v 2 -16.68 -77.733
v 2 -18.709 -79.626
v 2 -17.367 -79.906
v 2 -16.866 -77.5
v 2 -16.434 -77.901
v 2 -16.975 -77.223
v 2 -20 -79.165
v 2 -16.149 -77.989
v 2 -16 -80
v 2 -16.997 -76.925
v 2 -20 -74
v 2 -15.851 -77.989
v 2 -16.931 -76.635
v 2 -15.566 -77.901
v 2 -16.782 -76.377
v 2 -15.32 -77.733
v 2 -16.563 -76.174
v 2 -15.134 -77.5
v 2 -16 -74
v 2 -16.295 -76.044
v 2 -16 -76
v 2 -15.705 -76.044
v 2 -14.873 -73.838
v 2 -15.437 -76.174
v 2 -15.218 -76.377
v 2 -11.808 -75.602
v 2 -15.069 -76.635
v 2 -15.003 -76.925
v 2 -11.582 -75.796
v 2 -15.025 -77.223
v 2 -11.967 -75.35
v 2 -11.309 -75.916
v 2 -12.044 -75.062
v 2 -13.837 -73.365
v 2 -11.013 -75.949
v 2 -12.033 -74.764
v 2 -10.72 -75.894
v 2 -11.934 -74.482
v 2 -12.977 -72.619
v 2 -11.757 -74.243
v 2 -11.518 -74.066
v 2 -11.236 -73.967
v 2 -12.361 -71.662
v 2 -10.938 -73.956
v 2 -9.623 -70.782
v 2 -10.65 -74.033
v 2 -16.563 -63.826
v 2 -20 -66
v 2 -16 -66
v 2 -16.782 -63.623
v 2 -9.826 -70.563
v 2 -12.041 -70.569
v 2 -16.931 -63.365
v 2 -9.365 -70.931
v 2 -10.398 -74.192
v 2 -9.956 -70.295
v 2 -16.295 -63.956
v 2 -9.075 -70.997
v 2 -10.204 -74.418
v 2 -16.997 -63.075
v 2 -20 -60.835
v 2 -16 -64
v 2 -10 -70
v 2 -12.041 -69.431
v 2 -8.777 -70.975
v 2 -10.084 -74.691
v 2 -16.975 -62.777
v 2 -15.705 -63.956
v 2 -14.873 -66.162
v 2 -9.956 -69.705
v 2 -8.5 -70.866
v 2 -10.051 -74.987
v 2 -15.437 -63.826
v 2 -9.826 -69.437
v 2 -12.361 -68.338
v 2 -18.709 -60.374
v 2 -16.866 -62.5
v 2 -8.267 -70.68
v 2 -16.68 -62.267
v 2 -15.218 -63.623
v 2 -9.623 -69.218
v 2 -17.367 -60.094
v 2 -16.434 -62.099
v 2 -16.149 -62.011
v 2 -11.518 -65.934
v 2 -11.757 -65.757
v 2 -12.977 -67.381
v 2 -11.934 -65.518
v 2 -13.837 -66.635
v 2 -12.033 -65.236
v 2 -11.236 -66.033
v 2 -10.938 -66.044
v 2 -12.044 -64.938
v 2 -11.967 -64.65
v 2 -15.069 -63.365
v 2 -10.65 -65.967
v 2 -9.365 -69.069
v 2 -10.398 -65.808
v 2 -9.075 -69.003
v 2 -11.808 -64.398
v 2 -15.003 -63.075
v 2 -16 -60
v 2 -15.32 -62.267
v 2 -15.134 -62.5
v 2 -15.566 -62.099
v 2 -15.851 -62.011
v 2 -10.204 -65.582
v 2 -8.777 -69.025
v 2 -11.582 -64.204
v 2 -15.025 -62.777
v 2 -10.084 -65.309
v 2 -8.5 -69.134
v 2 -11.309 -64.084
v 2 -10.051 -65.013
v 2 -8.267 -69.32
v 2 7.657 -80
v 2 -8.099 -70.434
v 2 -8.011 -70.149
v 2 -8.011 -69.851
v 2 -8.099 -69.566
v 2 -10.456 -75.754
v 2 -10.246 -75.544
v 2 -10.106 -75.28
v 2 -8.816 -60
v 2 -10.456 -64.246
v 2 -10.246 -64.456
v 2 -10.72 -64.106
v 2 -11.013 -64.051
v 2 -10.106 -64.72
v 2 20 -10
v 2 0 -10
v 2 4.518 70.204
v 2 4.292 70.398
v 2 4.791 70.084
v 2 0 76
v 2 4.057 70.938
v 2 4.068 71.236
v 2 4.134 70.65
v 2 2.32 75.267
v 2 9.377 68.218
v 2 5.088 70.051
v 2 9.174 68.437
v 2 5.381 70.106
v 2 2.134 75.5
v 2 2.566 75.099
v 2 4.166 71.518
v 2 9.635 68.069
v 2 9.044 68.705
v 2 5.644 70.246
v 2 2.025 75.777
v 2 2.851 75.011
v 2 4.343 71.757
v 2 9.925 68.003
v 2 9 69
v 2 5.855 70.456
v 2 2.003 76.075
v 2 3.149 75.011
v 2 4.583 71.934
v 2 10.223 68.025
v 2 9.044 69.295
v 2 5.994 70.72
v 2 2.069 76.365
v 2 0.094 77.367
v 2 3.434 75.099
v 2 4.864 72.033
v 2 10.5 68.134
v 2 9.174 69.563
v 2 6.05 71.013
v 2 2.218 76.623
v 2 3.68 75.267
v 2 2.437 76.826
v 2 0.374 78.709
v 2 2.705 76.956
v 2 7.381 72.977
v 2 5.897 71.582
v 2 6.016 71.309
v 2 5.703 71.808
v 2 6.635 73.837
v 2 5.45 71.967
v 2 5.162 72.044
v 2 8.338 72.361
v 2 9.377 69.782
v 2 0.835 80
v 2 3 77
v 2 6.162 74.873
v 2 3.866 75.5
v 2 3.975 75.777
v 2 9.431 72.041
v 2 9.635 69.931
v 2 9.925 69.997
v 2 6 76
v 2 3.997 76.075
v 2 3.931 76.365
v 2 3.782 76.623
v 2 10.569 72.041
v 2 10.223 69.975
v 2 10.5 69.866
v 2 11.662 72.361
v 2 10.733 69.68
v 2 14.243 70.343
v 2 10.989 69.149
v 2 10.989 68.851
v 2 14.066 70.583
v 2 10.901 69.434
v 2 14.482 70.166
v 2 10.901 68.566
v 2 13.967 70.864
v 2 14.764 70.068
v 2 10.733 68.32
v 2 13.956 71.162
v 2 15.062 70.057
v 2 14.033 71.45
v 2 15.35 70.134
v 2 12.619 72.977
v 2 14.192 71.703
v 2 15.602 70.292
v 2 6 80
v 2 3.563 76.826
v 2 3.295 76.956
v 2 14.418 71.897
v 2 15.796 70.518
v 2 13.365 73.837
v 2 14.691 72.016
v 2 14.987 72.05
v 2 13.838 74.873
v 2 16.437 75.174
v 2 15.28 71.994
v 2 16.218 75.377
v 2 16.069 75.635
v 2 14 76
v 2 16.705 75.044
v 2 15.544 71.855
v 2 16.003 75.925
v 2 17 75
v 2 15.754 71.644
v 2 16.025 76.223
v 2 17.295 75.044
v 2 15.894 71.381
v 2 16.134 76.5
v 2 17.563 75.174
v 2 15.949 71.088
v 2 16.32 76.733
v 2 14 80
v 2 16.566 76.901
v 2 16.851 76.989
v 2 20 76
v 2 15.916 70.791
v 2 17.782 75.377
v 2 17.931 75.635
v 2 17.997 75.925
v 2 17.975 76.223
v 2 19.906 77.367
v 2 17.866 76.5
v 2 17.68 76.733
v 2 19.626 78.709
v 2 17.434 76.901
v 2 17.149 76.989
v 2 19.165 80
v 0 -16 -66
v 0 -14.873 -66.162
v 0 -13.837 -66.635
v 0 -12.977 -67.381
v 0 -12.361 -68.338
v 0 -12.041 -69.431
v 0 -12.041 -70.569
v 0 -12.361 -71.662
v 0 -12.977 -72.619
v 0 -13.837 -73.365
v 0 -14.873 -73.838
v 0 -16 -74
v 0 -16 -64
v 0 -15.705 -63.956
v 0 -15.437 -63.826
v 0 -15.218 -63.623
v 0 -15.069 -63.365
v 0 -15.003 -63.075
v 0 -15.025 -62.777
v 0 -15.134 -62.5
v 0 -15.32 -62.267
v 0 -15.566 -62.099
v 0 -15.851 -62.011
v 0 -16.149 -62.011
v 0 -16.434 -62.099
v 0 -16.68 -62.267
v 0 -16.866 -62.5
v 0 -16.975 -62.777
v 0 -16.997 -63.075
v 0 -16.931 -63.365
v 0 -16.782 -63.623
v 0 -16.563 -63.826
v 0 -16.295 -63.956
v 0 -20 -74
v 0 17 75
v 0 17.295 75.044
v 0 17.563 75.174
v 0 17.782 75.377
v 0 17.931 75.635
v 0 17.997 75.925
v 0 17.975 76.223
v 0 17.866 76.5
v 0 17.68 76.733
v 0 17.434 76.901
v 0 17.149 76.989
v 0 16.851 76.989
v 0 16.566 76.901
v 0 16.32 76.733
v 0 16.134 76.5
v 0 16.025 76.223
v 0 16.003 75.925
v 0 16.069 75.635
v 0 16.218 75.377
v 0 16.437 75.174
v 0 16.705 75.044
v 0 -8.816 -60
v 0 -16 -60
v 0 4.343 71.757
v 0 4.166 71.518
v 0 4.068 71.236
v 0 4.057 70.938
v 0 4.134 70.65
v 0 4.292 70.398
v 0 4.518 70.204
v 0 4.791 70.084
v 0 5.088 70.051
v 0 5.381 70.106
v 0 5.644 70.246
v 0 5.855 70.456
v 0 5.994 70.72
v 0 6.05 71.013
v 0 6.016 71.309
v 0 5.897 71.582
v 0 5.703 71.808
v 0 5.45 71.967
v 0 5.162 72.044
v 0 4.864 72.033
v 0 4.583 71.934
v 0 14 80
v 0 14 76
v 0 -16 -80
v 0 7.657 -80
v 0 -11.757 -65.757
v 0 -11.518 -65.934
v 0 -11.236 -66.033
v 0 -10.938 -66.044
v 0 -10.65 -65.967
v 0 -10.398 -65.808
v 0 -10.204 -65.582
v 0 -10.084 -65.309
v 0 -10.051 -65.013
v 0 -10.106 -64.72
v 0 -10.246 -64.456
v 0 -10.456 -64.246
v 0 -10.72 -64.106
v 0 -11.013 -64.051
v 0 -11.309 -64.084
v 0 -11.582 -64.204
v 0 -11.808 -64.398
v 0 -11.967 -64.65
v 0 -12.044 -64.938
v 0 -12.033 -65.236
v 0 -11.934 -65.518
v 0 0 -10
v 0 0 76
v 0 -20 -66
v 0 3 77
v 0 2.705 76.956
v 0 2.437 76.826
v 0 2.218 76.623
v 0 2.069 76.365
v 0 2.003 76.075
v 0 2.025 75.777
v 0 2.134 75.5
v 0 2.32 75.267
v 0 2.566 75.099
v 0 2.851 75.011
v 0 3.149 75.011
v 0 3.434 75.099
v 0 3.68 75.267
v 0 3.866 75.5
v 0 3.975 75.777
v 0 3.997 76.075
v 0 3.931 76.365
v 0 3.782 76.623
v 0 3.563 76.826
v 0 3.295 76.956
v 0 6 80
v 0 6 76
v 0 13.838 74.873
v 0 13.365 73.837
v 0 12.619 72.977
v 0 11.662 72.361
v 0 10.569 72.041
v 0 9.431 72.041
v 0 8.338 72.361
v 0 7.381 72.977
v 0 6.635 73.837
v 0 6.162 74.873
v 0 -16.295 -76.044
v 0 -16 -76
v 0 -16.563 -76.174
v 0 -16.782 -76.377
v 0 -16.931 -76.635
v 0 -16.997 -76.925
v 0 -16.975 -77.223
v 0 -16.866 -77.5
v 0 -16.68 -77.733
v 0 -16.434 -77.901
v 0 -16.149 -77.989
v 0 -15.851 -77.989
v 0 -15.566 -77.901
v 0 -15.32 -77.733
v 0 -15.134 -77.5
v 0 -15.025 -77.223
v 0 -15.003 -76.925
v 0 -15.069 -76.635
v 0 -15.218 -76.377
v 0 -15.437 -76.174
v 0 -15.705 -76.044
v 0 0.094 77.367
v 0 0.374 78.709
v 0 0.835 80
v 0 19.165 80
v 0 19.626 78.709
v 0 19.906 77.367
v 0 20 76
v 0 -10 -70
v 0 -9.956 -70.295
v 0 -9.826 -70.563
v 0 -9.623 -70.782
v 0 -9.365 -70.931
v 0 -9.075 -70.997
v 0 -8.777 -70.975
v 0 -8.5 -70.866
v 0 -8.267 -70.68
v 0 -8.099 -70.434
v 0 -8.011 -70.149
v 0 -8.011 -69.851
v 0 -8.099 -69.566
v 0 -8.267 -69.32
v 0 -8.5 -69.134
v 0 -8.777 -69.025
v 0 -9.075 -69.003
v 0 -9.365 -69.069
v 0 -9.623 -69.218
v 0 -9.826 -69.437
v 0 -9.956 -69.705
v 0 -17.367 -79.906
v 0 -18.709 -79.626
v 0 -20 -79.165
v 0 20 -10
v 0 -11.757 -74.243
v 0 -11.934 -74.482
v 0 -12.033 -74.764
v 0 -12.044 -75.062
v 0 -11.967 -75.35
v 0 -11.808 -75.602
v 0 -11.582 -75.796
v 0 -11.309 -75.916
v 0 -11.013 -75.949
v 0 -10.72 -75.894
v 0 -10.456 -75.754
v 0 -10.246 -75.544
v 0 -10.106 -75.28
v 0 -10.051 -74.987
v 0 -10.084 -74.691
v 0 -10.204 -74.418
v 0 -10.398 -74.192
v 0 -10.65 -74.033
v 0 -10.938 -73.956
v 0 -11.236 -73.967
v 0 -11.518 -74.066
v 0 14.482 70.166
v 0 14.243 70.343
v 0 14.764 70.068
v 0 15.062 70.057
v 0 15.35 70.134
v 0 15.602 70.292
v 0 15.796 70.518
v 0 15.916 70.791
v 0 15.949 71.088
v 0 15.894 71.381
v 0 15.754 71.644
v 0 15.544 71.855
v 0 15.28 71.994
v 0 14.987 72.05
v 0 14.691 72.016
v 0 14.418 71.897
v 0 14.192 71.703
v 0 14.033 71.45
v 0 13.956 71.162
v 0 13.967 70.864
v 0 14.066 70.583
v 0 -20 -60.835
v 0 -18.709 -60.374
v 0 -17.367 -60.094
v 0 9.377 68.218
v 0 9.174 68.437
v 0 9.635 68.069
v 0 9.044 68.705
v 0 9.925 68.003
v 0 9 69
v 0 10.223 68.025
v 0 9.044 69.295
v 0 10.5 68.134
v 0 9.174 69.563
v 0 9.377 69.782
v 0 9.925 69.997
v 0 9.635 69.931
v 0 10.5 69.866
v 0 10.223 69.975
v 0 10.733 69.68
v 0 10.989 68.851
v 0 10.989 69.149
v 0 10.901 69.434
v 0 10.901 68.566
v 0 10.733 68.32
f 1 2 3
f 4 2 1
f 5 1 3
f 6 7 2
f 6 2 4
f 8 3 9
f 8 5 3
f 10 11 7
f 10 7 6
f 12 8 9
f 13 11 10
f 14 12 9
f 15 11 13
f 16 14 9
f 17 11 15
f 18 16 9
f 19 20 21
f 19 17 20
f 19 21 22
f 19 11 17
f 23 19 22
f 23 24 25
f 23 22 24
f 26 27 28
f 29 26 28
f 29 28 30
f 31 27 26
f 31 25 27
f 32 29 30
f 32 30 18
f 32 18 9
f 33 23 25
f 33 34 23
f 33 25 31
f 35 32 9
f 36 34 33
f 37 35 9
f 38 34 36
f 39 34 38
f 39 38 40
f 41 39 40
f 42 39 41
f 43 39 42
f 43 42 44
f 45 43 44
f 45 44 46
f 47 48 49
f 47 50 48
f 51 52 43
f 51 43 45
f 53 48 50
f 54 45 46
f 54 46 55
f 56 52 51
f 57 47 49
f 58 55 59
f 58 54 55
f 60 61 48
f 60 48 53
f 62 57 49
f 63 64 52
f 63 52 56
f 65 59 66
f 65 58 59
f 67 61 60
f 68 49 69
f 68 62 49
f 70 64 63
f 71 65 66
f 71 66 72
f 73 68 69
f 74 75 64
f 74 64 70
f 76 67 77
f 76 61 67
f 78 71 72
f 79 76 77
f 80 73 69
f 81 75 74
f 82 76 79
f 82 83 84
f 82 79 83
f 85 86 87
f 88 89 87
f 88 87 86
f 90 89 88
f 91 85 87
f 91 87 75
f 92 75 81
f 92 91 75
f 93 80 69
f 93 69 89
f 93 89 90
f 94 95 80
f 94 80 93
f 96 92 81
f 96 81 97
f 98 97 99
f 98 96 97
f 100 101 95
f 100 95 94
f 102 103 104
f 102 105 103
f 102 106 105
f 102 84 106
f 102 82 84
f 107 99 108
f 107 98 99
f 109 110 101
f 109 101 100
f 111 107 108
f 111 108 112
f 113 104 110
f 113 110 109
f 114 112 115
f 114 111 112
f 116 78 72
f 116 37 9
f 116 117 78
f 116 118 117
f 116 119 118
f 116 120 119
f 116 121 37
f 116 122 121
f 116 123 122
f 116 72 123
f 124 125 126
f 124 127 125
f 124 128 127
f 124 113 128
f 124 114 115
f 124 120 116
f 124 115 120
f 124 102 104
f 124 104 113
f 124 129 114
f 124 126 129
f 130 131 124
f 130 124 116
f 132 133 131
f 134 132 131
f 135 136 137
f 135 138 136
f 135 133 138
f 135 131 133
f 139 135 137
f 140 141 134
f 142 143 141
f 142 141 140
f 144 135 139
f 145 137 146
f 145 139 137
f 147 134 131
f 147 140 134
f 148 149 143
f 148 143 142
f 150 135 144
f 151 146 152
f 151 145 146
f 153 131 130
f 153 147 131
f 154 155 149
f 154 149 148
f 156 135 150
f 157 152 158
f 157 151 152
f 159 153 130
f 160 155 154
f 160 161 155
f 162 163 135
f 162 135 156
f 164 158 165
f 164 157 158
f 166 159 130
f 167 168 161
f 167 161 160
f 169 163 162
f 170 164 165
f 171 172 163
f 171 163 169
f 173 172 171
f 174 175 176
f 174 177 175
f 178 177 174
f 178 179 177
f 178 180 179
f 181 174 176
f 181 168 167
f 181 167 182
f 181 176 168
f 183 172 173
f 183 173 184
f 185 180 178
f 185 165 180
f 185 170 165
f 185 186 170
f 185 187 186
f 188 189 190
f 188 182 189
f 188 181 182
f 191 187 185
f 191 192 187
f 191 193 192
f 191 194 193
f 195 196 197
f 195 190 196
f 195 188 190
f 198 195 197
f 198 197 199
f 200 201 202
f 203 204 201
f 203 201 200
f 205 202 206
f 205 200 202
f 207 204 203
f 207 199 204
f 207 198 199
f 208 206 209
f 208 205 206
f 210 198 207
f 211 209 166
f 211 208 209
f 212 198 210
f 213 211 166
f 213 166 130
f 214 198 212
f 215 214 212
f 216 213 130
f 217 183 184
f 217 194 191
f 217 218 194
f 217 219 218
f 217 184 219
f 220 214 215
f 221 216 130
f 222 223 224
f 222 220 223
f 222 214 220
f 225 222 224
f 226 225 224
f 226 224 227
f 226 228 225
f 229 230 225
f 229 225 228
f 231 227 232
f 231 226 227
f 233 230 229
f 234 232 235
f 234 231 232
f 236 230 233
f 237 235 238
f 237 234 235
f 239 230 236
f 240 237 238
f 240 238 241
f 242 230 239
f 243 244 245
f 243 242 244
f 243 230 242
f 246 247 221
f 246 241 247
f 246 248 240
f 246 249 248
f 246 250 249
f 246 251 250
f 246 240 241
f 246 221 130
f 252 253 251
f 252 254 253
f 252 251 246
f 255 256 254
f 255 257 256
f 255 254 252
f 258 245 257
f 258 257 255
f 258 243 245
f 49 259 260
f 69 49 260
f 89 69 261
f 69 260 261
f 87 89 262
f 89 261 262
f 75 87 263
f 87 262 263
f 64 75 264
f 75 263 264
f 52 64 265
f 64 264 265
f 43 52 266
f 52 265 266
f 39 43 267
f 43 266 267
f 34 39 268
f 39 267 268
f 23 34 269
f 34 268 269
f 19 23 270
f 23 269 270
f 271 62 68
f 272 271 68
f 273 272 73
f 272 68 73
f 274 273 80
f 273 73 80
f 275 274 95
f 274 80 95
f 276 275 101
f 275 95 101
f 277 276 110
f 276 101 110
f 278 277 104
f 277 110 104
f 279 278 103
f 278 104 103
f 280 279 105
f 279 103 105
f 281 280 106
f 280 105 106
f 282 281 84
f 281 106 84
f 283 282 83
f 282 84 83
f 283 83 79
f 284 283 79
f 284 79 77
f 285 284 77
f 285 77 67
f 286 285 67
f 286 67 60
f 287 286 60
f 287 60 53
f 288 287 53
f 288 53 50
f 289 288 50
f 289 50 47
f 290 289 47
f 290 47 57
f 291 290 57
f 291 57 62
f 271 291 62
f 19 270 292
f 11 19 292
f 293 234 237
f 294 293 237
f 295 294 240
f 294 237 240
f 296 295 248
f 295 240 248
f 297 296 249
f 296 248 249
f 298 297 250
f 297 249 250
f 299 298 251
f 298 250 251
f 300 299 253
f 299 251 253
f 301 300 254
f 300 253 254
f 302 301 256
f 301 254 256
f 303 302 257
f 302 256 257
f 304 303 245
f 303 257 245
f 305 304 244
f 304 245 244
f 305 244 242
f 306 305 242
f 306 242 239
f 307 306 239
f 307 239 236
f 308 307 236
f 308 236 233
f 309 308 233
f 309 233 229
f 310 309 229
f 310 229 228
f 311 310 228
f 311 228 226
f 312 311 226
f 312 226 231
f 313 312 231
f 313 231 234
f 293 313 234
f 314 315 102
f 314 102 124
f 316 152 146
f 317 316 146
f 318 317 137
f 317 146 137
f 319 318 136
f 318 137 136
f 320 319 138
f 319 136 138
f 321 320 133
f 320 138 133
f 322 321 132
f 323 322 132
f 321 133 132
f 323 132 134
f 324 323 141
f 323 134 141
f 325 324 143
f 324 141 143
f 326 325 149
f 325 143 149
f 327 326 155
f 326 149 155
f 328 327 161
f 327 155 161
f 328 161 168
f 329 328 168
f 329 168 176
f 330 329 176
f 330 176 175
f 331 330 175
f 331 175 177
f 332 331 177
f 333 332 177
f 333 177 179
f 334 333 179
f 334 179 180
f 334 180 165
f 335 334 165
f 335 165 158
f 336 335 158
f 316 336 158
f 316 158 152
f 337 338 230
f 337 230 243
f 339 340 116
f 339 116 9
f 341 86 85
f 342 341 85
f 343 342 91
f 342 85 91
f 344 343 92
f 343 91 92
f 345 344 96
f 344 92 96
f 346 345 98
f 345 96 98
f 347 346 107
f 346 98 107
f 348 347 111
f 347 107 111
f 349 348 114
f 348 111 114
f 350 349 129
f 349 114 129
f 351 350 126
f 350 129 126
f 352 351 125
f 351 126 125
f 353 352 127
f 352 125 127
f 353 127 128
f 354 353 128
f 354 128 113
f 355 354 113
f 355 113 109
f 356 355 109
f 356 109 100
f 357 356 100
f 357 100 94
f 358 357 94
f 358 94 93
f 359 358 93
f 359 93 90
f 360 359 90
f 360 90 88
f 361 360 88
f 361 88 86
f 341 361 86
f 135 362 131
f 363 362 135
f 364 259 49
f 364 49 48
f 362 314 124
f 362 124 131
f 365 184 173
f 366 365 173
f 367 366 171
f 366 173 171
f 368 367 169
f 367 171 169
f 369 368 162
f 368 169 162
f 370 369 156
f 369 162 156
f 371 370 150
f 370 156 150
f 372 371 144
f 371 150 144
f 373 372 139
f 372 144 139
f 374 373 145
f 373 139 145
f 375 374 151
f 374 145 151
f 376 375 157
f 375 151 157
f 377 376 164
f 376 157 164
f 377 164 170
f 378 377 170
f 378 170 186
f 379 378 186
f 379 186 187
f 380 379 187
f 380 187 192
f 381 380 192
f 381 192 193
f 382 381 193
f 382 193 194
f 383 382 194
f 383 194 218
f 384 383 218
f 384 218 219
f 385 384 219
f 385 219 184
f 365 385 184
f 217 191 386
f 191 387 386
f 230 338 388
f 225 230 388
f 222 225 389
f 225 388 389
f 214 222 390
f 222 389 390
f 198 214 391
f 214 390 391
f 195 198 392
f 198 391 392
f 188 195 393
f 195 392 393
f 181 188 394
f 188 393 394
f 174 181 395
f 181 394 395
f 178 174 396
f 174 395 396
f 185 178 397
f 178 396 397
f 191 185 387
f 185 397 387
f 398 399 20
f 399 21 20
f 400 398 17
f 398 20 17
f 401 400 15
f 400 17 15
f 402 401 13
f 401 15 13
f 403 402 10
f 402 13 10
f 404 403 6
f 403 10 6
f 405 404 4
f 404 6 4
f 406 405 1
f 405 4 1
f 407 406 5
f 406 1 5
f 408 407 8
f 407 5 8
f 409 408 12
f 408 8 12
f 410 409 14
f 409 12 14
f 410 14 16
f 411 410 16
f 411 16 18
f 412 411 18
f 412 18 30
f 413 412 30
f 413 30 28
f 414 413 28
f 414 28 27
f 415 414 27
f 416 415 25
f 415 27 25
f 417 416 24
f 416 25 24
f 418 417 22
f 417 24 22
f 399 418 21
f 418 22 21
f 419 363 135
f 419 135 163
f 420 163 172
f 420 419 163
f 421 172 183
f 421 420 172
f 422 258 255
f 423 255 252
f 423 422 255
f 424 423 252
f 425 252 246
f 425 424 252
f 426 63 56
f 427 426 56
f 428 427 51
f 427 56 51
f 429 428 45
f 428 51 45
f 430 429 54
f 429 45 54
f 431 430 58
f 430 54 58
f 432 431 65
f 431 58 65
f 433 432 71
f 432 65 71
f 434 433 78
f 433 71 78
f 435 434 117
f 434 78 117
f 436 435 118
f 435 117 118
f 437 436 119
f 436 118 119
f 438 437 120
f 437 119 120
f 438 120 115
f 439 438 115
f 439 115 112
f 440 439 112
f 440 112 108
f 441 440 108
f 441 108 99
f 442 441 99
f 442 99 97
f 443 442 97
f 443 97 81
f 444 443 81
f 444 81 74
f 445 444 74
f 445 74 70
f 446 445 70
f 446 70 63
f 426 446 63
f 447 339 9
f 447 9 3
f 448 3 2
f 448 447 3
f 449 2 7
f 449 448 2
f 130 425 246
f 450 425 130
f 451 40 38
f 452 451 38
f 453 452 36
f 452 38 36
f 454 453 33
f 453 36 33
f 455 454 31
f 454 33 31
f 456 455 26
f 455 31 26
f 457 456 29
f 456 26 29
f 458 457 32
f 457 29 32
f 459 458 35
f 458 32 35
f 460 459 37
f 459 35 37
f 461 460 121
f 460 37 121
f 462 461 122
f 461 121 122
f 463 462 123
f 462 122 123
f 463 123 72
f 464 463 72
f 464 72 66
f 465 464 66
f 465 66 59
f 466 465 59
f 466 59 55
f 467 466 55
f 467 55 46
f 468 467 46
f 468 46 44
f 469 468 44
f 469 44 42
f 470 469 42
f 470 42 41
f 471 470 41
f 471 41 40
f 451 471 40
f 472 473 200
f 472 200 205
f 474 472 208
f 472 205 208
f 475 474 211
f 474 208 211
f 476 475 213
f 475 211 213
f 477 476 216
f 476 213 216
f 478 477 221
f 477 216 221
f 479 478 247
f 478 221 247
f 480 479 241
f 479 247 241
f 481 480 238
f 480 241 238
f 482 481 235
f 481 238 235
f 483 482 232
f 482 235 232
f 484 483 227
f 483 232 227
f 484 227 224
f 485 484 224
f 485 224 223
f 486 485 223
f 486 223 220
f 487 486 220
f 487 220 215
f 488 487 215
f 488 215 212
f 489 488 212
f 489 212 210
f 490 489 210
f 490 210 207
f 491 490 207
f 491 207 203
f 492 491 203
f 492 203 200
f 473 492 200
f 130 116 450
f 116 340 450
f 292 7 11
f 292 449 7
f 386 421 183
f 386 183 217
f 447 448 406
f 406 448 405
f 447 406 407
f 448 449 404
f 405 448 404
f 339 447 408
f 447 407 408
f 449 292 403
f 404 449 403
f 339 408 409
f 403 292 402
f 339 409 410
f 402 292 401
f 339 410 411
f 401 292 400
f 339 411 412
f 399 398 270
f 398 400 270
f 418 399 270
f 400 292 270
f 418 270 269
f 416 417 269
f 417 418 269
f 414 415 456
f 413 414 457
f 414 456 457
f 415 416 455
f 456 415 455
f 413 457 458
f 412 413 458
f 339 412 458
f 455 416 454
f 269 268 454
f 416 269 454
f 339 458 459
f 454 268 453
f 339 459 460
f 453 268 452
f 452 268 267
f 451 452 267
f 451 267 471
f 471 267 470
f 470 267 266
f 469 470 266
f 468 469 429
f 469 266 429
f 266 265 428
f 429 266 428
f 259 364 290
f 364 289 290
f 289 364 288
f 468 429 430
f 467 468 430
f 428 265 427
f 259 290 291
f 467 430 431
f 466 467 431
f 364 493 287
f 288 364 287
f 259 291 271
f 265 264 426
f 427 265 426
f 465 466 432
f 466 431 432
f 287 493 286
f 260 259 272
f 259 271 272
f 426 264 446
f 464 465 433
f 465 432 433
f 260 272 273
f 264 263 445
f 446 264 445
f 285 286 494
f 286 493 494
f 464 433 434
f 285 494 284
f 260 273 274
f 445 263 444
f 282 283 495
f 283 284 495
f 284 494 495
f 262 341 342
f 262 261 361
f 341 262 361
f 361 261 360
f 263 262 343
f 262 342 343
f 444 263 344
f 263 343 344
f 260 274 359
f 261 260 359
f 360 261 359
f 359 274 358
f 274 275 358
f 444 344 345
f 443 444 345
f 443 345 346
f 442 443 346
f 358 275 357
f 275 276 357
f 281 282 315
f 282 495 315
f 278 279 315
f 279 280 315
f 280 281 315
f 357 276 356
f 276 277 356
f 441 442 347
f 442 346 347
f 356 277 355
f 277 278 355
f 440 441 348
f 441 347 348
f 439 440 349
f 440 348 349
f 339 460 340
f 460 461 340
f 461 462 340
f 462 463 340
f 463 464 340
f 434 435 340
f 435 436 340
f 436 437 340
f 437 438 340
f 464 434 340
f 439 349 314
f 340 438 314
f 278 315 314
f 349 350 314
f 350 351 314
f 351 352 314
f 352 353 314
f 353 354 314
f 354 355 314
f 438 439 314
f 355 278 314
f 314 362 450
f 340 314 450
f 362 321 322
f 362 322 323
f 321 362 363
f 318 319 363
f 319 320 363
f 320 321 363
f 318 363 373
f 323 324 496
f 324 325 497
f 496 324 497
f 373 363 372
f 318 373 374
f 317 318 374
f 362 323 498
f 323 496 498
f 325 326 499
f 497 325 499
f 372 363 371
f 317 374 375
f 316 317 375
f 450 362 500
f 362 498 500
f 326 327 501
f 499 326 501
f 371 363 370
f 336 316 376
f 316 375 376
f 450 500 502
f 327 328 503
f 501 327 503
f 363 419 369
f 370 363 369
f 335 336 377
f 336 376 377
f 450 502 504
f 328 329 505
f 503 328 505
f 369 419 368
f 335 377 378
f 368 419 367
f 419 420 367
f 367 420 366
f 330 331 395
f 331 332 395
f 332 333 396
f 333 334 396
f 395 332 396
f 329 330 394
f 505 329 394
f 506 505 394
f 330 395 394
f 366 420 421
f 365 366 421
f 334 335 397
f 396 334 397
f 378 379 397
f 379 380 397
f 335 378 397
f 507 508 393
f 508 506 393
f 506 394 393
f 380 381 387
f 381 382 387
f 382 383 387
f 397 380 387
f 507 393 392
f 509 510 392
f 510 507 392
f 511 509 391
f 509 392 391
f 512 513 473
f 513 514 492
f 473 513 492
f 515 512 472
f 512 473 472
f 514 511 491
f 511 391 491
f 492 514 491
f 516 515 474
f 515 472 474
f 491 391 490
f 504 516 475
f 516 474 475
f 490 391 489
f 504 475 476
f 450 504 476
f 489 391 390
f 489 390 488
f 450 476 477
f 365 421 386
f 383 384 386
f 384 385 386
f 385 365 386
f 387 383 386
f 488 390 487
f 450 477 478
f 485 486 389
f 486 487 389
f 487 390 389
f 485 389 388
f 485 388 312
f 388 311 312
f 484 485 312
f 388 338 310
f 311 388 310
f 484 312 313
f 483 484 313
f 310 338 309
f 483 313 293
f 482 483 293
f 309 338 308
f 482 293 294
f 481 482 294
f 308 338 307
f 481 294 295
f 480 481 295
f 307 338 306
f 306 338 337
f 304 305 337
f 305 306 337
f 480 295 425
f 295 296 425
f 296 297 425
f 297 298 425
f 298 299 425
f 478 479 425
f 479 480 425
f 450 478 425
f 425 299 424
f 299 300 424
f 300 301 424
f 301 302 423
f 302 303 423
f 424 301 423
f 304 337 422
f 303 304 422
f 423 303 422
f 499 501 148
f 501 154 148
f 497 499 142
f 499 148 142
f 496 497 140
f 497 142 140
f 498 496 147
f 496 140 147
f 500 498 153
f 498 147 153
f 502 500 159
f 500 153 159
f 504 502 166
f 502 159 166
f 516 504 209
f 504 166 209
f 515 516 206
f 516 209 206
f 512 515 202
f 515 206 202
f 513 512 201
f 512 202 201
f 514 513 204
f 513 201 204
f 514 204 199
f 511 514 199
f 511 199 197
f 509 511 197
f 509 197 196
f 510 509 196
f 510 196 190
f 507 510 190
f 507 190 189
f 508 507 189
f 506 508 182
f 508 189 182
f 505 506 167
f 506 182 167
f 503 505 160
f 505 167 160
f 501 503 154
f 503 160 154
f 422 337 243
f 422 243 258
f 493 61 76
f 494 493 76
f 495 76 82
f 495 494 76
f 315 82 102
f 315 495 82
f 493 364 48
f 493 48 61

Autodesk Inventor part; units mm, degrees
ref_plane "YZ Plane" through (0, 0, 0) normal (1, 0, 0) x (0, 1, 0)
ref_plane "XZ Plane" through (0, 0, 0) normal (0, 1, 0) x (-1, 0, 0)
ref_plane "XY Plane" through (0, 0, 0) normal (0, 0, 1) x (1, 0, 0)
sketch "スケッチ1" plane through (0, 0, 0) normal (1, 0, 0) x (0, 1, 0)
  line L0 (-20, 80) -> (20, 80)
  line L1 (20, 80) -> (20, -80)
  line L2 (20, -80) -> (-20, -80)
  line L3 (-20, -80) -> (-20, 80)
  point P0 (0, 0)
  dimension "d0" = 160
  dimension "d2" = 40
  dimension "d3" = 20
  dimension "d4" = 80
extrude "押し出し1" add sketch "スケッチ1" along normal blind 2
sketch "スケッチ3" plane through (0, 0, 0) normal (-1, 0, 0) x (0, 0, 1)
  line L0 (80, -20) -> (80, 20) projected
  line L1 (80, 20) -> (-80, 20) projected
  line L2 (-80, 20) -> (-80, -20) projected
  line L3 (-80, -20) -> (80, -20) projected
  line L4 (-60, -20) -> (-60, -8.8163)
  line L5 (-60, -8.8163) -> (-10, 0)
  line L6 (-10, 0) -> (80, 0)
  line L7 (80, 0) -> (80, 20)
  line L8 (-80, 7.6571) -> (-10, 20)
  point P0 (0, 0)
  dimension "d11" = 20
  dimension "d12" = 10
  dimension "d13" = 10
  dimension "d14" = 20
  dimension "d15" = 160
  dimension "d17" = 90
  dimension "d18" = 90
extrude "押し出し3" cut sketch "スケッチ3" against normal blind 20 contours L6 L5 L4 L3 L2 L8 L1 L0 keep common part
sketch "スケッチ6" plane through (0, 0, 0) normal (-1, 0, 0) x (0, 0, 1)
  line L0 (-60, -8.8163) -> (-60, -20) projected
  line L1 (-10, 0) -> (-60, -8.8163) projected
  line L2 (80, 0) -> (-10, 0) projected
  line L3 (80, 0) -> (80, 20) projected
  line L4 (80, 20) -> (-10, 20) projected
  line L5 (-80, 7.6571) -> (-10, 20) projected
  line L6 (-80, 7.6571) -> (-80, -20) projected
  line L7 (-80, -20) -> (-60, -20) projected
  arc A0 (-66, -16) -> (-74, -16) centre (-70, -16) ccw
  arc A1 (76, 14) -> (76, 6) centre (76, 10) ccw
  line L8 (-74, -16) -> (-74, -20)
  line L9 (-66, -16) -> (-66, -20)
  line L10 (76, 14) -> (80, 14)
  line L11 (76, 6) -> (80, 6)
  arc A2 (-60.8348, -20) -> (-60, -16) centre (-70, -16) ccw
  arc A3 (-80, -16) -> (-79.1652, -20) centre (-70, -16) ccw
  arc A4 (76, 0) -> (80, 0.8348) centre (76, 10) ccw
  arc A5 (80, 19.1652) -> (76, 20) centre (76, 10) ccw
  point P0 (0, 0)
  dimension "d39" = 8
  dimension "d40" = 4
  dimension "d41" = 4
  dimension "d42" = 10
  dimension "d43" = 10
extrude "押し出し6" cut sketch "スケッチ6" against normal blind 11 contours L0 A2 L7 L9 A0 L8 A3 L6 L5 L4 A5 L3 L10 A1 L11 A4 L2 L1 keep common part
sketch "スケッチ7" plane through (0, 0, 0) normal (-1, 0, 0) x (0, 0, 1)
  arc A0 (80, 19.1652) -> (76, 20) centre (76, 10) ccw projected
  arc A1 (-80, -16) -> (-79.1652, -20) centre (-70, -16) ccw projected
  line L0 (-79.1652, -20) -> (-74, -20) projected
  line L1 (80, 0.8348) -> (80, 6) projected
  circle A2 centre (76, 3) radius 1
  circle A3 centre (-77, -16) radius 1
  point P0 (0, 0)
  dimension "d46" = 2
  dimension "d48" = 7
  dimension "d49" = 4
  dimension "d50" = 4
  dimension "d51" = 7
hole "穴1" at (0, -16, -77) at (0, 3, 76) direction (1, 0, 0) diameter 2 end through all
pattern_circular "円形状パターン1" count 5 over 180 about axis through (0, -16, -70) along (1, 0, 0) of "穴1"
pattern_circular "円形状パターン2" count 5 over 180 about axis through (0, 10, 76) along (1, 0, 0) of "穴1"
properties part number "10" material "アルミニウム 6061"
